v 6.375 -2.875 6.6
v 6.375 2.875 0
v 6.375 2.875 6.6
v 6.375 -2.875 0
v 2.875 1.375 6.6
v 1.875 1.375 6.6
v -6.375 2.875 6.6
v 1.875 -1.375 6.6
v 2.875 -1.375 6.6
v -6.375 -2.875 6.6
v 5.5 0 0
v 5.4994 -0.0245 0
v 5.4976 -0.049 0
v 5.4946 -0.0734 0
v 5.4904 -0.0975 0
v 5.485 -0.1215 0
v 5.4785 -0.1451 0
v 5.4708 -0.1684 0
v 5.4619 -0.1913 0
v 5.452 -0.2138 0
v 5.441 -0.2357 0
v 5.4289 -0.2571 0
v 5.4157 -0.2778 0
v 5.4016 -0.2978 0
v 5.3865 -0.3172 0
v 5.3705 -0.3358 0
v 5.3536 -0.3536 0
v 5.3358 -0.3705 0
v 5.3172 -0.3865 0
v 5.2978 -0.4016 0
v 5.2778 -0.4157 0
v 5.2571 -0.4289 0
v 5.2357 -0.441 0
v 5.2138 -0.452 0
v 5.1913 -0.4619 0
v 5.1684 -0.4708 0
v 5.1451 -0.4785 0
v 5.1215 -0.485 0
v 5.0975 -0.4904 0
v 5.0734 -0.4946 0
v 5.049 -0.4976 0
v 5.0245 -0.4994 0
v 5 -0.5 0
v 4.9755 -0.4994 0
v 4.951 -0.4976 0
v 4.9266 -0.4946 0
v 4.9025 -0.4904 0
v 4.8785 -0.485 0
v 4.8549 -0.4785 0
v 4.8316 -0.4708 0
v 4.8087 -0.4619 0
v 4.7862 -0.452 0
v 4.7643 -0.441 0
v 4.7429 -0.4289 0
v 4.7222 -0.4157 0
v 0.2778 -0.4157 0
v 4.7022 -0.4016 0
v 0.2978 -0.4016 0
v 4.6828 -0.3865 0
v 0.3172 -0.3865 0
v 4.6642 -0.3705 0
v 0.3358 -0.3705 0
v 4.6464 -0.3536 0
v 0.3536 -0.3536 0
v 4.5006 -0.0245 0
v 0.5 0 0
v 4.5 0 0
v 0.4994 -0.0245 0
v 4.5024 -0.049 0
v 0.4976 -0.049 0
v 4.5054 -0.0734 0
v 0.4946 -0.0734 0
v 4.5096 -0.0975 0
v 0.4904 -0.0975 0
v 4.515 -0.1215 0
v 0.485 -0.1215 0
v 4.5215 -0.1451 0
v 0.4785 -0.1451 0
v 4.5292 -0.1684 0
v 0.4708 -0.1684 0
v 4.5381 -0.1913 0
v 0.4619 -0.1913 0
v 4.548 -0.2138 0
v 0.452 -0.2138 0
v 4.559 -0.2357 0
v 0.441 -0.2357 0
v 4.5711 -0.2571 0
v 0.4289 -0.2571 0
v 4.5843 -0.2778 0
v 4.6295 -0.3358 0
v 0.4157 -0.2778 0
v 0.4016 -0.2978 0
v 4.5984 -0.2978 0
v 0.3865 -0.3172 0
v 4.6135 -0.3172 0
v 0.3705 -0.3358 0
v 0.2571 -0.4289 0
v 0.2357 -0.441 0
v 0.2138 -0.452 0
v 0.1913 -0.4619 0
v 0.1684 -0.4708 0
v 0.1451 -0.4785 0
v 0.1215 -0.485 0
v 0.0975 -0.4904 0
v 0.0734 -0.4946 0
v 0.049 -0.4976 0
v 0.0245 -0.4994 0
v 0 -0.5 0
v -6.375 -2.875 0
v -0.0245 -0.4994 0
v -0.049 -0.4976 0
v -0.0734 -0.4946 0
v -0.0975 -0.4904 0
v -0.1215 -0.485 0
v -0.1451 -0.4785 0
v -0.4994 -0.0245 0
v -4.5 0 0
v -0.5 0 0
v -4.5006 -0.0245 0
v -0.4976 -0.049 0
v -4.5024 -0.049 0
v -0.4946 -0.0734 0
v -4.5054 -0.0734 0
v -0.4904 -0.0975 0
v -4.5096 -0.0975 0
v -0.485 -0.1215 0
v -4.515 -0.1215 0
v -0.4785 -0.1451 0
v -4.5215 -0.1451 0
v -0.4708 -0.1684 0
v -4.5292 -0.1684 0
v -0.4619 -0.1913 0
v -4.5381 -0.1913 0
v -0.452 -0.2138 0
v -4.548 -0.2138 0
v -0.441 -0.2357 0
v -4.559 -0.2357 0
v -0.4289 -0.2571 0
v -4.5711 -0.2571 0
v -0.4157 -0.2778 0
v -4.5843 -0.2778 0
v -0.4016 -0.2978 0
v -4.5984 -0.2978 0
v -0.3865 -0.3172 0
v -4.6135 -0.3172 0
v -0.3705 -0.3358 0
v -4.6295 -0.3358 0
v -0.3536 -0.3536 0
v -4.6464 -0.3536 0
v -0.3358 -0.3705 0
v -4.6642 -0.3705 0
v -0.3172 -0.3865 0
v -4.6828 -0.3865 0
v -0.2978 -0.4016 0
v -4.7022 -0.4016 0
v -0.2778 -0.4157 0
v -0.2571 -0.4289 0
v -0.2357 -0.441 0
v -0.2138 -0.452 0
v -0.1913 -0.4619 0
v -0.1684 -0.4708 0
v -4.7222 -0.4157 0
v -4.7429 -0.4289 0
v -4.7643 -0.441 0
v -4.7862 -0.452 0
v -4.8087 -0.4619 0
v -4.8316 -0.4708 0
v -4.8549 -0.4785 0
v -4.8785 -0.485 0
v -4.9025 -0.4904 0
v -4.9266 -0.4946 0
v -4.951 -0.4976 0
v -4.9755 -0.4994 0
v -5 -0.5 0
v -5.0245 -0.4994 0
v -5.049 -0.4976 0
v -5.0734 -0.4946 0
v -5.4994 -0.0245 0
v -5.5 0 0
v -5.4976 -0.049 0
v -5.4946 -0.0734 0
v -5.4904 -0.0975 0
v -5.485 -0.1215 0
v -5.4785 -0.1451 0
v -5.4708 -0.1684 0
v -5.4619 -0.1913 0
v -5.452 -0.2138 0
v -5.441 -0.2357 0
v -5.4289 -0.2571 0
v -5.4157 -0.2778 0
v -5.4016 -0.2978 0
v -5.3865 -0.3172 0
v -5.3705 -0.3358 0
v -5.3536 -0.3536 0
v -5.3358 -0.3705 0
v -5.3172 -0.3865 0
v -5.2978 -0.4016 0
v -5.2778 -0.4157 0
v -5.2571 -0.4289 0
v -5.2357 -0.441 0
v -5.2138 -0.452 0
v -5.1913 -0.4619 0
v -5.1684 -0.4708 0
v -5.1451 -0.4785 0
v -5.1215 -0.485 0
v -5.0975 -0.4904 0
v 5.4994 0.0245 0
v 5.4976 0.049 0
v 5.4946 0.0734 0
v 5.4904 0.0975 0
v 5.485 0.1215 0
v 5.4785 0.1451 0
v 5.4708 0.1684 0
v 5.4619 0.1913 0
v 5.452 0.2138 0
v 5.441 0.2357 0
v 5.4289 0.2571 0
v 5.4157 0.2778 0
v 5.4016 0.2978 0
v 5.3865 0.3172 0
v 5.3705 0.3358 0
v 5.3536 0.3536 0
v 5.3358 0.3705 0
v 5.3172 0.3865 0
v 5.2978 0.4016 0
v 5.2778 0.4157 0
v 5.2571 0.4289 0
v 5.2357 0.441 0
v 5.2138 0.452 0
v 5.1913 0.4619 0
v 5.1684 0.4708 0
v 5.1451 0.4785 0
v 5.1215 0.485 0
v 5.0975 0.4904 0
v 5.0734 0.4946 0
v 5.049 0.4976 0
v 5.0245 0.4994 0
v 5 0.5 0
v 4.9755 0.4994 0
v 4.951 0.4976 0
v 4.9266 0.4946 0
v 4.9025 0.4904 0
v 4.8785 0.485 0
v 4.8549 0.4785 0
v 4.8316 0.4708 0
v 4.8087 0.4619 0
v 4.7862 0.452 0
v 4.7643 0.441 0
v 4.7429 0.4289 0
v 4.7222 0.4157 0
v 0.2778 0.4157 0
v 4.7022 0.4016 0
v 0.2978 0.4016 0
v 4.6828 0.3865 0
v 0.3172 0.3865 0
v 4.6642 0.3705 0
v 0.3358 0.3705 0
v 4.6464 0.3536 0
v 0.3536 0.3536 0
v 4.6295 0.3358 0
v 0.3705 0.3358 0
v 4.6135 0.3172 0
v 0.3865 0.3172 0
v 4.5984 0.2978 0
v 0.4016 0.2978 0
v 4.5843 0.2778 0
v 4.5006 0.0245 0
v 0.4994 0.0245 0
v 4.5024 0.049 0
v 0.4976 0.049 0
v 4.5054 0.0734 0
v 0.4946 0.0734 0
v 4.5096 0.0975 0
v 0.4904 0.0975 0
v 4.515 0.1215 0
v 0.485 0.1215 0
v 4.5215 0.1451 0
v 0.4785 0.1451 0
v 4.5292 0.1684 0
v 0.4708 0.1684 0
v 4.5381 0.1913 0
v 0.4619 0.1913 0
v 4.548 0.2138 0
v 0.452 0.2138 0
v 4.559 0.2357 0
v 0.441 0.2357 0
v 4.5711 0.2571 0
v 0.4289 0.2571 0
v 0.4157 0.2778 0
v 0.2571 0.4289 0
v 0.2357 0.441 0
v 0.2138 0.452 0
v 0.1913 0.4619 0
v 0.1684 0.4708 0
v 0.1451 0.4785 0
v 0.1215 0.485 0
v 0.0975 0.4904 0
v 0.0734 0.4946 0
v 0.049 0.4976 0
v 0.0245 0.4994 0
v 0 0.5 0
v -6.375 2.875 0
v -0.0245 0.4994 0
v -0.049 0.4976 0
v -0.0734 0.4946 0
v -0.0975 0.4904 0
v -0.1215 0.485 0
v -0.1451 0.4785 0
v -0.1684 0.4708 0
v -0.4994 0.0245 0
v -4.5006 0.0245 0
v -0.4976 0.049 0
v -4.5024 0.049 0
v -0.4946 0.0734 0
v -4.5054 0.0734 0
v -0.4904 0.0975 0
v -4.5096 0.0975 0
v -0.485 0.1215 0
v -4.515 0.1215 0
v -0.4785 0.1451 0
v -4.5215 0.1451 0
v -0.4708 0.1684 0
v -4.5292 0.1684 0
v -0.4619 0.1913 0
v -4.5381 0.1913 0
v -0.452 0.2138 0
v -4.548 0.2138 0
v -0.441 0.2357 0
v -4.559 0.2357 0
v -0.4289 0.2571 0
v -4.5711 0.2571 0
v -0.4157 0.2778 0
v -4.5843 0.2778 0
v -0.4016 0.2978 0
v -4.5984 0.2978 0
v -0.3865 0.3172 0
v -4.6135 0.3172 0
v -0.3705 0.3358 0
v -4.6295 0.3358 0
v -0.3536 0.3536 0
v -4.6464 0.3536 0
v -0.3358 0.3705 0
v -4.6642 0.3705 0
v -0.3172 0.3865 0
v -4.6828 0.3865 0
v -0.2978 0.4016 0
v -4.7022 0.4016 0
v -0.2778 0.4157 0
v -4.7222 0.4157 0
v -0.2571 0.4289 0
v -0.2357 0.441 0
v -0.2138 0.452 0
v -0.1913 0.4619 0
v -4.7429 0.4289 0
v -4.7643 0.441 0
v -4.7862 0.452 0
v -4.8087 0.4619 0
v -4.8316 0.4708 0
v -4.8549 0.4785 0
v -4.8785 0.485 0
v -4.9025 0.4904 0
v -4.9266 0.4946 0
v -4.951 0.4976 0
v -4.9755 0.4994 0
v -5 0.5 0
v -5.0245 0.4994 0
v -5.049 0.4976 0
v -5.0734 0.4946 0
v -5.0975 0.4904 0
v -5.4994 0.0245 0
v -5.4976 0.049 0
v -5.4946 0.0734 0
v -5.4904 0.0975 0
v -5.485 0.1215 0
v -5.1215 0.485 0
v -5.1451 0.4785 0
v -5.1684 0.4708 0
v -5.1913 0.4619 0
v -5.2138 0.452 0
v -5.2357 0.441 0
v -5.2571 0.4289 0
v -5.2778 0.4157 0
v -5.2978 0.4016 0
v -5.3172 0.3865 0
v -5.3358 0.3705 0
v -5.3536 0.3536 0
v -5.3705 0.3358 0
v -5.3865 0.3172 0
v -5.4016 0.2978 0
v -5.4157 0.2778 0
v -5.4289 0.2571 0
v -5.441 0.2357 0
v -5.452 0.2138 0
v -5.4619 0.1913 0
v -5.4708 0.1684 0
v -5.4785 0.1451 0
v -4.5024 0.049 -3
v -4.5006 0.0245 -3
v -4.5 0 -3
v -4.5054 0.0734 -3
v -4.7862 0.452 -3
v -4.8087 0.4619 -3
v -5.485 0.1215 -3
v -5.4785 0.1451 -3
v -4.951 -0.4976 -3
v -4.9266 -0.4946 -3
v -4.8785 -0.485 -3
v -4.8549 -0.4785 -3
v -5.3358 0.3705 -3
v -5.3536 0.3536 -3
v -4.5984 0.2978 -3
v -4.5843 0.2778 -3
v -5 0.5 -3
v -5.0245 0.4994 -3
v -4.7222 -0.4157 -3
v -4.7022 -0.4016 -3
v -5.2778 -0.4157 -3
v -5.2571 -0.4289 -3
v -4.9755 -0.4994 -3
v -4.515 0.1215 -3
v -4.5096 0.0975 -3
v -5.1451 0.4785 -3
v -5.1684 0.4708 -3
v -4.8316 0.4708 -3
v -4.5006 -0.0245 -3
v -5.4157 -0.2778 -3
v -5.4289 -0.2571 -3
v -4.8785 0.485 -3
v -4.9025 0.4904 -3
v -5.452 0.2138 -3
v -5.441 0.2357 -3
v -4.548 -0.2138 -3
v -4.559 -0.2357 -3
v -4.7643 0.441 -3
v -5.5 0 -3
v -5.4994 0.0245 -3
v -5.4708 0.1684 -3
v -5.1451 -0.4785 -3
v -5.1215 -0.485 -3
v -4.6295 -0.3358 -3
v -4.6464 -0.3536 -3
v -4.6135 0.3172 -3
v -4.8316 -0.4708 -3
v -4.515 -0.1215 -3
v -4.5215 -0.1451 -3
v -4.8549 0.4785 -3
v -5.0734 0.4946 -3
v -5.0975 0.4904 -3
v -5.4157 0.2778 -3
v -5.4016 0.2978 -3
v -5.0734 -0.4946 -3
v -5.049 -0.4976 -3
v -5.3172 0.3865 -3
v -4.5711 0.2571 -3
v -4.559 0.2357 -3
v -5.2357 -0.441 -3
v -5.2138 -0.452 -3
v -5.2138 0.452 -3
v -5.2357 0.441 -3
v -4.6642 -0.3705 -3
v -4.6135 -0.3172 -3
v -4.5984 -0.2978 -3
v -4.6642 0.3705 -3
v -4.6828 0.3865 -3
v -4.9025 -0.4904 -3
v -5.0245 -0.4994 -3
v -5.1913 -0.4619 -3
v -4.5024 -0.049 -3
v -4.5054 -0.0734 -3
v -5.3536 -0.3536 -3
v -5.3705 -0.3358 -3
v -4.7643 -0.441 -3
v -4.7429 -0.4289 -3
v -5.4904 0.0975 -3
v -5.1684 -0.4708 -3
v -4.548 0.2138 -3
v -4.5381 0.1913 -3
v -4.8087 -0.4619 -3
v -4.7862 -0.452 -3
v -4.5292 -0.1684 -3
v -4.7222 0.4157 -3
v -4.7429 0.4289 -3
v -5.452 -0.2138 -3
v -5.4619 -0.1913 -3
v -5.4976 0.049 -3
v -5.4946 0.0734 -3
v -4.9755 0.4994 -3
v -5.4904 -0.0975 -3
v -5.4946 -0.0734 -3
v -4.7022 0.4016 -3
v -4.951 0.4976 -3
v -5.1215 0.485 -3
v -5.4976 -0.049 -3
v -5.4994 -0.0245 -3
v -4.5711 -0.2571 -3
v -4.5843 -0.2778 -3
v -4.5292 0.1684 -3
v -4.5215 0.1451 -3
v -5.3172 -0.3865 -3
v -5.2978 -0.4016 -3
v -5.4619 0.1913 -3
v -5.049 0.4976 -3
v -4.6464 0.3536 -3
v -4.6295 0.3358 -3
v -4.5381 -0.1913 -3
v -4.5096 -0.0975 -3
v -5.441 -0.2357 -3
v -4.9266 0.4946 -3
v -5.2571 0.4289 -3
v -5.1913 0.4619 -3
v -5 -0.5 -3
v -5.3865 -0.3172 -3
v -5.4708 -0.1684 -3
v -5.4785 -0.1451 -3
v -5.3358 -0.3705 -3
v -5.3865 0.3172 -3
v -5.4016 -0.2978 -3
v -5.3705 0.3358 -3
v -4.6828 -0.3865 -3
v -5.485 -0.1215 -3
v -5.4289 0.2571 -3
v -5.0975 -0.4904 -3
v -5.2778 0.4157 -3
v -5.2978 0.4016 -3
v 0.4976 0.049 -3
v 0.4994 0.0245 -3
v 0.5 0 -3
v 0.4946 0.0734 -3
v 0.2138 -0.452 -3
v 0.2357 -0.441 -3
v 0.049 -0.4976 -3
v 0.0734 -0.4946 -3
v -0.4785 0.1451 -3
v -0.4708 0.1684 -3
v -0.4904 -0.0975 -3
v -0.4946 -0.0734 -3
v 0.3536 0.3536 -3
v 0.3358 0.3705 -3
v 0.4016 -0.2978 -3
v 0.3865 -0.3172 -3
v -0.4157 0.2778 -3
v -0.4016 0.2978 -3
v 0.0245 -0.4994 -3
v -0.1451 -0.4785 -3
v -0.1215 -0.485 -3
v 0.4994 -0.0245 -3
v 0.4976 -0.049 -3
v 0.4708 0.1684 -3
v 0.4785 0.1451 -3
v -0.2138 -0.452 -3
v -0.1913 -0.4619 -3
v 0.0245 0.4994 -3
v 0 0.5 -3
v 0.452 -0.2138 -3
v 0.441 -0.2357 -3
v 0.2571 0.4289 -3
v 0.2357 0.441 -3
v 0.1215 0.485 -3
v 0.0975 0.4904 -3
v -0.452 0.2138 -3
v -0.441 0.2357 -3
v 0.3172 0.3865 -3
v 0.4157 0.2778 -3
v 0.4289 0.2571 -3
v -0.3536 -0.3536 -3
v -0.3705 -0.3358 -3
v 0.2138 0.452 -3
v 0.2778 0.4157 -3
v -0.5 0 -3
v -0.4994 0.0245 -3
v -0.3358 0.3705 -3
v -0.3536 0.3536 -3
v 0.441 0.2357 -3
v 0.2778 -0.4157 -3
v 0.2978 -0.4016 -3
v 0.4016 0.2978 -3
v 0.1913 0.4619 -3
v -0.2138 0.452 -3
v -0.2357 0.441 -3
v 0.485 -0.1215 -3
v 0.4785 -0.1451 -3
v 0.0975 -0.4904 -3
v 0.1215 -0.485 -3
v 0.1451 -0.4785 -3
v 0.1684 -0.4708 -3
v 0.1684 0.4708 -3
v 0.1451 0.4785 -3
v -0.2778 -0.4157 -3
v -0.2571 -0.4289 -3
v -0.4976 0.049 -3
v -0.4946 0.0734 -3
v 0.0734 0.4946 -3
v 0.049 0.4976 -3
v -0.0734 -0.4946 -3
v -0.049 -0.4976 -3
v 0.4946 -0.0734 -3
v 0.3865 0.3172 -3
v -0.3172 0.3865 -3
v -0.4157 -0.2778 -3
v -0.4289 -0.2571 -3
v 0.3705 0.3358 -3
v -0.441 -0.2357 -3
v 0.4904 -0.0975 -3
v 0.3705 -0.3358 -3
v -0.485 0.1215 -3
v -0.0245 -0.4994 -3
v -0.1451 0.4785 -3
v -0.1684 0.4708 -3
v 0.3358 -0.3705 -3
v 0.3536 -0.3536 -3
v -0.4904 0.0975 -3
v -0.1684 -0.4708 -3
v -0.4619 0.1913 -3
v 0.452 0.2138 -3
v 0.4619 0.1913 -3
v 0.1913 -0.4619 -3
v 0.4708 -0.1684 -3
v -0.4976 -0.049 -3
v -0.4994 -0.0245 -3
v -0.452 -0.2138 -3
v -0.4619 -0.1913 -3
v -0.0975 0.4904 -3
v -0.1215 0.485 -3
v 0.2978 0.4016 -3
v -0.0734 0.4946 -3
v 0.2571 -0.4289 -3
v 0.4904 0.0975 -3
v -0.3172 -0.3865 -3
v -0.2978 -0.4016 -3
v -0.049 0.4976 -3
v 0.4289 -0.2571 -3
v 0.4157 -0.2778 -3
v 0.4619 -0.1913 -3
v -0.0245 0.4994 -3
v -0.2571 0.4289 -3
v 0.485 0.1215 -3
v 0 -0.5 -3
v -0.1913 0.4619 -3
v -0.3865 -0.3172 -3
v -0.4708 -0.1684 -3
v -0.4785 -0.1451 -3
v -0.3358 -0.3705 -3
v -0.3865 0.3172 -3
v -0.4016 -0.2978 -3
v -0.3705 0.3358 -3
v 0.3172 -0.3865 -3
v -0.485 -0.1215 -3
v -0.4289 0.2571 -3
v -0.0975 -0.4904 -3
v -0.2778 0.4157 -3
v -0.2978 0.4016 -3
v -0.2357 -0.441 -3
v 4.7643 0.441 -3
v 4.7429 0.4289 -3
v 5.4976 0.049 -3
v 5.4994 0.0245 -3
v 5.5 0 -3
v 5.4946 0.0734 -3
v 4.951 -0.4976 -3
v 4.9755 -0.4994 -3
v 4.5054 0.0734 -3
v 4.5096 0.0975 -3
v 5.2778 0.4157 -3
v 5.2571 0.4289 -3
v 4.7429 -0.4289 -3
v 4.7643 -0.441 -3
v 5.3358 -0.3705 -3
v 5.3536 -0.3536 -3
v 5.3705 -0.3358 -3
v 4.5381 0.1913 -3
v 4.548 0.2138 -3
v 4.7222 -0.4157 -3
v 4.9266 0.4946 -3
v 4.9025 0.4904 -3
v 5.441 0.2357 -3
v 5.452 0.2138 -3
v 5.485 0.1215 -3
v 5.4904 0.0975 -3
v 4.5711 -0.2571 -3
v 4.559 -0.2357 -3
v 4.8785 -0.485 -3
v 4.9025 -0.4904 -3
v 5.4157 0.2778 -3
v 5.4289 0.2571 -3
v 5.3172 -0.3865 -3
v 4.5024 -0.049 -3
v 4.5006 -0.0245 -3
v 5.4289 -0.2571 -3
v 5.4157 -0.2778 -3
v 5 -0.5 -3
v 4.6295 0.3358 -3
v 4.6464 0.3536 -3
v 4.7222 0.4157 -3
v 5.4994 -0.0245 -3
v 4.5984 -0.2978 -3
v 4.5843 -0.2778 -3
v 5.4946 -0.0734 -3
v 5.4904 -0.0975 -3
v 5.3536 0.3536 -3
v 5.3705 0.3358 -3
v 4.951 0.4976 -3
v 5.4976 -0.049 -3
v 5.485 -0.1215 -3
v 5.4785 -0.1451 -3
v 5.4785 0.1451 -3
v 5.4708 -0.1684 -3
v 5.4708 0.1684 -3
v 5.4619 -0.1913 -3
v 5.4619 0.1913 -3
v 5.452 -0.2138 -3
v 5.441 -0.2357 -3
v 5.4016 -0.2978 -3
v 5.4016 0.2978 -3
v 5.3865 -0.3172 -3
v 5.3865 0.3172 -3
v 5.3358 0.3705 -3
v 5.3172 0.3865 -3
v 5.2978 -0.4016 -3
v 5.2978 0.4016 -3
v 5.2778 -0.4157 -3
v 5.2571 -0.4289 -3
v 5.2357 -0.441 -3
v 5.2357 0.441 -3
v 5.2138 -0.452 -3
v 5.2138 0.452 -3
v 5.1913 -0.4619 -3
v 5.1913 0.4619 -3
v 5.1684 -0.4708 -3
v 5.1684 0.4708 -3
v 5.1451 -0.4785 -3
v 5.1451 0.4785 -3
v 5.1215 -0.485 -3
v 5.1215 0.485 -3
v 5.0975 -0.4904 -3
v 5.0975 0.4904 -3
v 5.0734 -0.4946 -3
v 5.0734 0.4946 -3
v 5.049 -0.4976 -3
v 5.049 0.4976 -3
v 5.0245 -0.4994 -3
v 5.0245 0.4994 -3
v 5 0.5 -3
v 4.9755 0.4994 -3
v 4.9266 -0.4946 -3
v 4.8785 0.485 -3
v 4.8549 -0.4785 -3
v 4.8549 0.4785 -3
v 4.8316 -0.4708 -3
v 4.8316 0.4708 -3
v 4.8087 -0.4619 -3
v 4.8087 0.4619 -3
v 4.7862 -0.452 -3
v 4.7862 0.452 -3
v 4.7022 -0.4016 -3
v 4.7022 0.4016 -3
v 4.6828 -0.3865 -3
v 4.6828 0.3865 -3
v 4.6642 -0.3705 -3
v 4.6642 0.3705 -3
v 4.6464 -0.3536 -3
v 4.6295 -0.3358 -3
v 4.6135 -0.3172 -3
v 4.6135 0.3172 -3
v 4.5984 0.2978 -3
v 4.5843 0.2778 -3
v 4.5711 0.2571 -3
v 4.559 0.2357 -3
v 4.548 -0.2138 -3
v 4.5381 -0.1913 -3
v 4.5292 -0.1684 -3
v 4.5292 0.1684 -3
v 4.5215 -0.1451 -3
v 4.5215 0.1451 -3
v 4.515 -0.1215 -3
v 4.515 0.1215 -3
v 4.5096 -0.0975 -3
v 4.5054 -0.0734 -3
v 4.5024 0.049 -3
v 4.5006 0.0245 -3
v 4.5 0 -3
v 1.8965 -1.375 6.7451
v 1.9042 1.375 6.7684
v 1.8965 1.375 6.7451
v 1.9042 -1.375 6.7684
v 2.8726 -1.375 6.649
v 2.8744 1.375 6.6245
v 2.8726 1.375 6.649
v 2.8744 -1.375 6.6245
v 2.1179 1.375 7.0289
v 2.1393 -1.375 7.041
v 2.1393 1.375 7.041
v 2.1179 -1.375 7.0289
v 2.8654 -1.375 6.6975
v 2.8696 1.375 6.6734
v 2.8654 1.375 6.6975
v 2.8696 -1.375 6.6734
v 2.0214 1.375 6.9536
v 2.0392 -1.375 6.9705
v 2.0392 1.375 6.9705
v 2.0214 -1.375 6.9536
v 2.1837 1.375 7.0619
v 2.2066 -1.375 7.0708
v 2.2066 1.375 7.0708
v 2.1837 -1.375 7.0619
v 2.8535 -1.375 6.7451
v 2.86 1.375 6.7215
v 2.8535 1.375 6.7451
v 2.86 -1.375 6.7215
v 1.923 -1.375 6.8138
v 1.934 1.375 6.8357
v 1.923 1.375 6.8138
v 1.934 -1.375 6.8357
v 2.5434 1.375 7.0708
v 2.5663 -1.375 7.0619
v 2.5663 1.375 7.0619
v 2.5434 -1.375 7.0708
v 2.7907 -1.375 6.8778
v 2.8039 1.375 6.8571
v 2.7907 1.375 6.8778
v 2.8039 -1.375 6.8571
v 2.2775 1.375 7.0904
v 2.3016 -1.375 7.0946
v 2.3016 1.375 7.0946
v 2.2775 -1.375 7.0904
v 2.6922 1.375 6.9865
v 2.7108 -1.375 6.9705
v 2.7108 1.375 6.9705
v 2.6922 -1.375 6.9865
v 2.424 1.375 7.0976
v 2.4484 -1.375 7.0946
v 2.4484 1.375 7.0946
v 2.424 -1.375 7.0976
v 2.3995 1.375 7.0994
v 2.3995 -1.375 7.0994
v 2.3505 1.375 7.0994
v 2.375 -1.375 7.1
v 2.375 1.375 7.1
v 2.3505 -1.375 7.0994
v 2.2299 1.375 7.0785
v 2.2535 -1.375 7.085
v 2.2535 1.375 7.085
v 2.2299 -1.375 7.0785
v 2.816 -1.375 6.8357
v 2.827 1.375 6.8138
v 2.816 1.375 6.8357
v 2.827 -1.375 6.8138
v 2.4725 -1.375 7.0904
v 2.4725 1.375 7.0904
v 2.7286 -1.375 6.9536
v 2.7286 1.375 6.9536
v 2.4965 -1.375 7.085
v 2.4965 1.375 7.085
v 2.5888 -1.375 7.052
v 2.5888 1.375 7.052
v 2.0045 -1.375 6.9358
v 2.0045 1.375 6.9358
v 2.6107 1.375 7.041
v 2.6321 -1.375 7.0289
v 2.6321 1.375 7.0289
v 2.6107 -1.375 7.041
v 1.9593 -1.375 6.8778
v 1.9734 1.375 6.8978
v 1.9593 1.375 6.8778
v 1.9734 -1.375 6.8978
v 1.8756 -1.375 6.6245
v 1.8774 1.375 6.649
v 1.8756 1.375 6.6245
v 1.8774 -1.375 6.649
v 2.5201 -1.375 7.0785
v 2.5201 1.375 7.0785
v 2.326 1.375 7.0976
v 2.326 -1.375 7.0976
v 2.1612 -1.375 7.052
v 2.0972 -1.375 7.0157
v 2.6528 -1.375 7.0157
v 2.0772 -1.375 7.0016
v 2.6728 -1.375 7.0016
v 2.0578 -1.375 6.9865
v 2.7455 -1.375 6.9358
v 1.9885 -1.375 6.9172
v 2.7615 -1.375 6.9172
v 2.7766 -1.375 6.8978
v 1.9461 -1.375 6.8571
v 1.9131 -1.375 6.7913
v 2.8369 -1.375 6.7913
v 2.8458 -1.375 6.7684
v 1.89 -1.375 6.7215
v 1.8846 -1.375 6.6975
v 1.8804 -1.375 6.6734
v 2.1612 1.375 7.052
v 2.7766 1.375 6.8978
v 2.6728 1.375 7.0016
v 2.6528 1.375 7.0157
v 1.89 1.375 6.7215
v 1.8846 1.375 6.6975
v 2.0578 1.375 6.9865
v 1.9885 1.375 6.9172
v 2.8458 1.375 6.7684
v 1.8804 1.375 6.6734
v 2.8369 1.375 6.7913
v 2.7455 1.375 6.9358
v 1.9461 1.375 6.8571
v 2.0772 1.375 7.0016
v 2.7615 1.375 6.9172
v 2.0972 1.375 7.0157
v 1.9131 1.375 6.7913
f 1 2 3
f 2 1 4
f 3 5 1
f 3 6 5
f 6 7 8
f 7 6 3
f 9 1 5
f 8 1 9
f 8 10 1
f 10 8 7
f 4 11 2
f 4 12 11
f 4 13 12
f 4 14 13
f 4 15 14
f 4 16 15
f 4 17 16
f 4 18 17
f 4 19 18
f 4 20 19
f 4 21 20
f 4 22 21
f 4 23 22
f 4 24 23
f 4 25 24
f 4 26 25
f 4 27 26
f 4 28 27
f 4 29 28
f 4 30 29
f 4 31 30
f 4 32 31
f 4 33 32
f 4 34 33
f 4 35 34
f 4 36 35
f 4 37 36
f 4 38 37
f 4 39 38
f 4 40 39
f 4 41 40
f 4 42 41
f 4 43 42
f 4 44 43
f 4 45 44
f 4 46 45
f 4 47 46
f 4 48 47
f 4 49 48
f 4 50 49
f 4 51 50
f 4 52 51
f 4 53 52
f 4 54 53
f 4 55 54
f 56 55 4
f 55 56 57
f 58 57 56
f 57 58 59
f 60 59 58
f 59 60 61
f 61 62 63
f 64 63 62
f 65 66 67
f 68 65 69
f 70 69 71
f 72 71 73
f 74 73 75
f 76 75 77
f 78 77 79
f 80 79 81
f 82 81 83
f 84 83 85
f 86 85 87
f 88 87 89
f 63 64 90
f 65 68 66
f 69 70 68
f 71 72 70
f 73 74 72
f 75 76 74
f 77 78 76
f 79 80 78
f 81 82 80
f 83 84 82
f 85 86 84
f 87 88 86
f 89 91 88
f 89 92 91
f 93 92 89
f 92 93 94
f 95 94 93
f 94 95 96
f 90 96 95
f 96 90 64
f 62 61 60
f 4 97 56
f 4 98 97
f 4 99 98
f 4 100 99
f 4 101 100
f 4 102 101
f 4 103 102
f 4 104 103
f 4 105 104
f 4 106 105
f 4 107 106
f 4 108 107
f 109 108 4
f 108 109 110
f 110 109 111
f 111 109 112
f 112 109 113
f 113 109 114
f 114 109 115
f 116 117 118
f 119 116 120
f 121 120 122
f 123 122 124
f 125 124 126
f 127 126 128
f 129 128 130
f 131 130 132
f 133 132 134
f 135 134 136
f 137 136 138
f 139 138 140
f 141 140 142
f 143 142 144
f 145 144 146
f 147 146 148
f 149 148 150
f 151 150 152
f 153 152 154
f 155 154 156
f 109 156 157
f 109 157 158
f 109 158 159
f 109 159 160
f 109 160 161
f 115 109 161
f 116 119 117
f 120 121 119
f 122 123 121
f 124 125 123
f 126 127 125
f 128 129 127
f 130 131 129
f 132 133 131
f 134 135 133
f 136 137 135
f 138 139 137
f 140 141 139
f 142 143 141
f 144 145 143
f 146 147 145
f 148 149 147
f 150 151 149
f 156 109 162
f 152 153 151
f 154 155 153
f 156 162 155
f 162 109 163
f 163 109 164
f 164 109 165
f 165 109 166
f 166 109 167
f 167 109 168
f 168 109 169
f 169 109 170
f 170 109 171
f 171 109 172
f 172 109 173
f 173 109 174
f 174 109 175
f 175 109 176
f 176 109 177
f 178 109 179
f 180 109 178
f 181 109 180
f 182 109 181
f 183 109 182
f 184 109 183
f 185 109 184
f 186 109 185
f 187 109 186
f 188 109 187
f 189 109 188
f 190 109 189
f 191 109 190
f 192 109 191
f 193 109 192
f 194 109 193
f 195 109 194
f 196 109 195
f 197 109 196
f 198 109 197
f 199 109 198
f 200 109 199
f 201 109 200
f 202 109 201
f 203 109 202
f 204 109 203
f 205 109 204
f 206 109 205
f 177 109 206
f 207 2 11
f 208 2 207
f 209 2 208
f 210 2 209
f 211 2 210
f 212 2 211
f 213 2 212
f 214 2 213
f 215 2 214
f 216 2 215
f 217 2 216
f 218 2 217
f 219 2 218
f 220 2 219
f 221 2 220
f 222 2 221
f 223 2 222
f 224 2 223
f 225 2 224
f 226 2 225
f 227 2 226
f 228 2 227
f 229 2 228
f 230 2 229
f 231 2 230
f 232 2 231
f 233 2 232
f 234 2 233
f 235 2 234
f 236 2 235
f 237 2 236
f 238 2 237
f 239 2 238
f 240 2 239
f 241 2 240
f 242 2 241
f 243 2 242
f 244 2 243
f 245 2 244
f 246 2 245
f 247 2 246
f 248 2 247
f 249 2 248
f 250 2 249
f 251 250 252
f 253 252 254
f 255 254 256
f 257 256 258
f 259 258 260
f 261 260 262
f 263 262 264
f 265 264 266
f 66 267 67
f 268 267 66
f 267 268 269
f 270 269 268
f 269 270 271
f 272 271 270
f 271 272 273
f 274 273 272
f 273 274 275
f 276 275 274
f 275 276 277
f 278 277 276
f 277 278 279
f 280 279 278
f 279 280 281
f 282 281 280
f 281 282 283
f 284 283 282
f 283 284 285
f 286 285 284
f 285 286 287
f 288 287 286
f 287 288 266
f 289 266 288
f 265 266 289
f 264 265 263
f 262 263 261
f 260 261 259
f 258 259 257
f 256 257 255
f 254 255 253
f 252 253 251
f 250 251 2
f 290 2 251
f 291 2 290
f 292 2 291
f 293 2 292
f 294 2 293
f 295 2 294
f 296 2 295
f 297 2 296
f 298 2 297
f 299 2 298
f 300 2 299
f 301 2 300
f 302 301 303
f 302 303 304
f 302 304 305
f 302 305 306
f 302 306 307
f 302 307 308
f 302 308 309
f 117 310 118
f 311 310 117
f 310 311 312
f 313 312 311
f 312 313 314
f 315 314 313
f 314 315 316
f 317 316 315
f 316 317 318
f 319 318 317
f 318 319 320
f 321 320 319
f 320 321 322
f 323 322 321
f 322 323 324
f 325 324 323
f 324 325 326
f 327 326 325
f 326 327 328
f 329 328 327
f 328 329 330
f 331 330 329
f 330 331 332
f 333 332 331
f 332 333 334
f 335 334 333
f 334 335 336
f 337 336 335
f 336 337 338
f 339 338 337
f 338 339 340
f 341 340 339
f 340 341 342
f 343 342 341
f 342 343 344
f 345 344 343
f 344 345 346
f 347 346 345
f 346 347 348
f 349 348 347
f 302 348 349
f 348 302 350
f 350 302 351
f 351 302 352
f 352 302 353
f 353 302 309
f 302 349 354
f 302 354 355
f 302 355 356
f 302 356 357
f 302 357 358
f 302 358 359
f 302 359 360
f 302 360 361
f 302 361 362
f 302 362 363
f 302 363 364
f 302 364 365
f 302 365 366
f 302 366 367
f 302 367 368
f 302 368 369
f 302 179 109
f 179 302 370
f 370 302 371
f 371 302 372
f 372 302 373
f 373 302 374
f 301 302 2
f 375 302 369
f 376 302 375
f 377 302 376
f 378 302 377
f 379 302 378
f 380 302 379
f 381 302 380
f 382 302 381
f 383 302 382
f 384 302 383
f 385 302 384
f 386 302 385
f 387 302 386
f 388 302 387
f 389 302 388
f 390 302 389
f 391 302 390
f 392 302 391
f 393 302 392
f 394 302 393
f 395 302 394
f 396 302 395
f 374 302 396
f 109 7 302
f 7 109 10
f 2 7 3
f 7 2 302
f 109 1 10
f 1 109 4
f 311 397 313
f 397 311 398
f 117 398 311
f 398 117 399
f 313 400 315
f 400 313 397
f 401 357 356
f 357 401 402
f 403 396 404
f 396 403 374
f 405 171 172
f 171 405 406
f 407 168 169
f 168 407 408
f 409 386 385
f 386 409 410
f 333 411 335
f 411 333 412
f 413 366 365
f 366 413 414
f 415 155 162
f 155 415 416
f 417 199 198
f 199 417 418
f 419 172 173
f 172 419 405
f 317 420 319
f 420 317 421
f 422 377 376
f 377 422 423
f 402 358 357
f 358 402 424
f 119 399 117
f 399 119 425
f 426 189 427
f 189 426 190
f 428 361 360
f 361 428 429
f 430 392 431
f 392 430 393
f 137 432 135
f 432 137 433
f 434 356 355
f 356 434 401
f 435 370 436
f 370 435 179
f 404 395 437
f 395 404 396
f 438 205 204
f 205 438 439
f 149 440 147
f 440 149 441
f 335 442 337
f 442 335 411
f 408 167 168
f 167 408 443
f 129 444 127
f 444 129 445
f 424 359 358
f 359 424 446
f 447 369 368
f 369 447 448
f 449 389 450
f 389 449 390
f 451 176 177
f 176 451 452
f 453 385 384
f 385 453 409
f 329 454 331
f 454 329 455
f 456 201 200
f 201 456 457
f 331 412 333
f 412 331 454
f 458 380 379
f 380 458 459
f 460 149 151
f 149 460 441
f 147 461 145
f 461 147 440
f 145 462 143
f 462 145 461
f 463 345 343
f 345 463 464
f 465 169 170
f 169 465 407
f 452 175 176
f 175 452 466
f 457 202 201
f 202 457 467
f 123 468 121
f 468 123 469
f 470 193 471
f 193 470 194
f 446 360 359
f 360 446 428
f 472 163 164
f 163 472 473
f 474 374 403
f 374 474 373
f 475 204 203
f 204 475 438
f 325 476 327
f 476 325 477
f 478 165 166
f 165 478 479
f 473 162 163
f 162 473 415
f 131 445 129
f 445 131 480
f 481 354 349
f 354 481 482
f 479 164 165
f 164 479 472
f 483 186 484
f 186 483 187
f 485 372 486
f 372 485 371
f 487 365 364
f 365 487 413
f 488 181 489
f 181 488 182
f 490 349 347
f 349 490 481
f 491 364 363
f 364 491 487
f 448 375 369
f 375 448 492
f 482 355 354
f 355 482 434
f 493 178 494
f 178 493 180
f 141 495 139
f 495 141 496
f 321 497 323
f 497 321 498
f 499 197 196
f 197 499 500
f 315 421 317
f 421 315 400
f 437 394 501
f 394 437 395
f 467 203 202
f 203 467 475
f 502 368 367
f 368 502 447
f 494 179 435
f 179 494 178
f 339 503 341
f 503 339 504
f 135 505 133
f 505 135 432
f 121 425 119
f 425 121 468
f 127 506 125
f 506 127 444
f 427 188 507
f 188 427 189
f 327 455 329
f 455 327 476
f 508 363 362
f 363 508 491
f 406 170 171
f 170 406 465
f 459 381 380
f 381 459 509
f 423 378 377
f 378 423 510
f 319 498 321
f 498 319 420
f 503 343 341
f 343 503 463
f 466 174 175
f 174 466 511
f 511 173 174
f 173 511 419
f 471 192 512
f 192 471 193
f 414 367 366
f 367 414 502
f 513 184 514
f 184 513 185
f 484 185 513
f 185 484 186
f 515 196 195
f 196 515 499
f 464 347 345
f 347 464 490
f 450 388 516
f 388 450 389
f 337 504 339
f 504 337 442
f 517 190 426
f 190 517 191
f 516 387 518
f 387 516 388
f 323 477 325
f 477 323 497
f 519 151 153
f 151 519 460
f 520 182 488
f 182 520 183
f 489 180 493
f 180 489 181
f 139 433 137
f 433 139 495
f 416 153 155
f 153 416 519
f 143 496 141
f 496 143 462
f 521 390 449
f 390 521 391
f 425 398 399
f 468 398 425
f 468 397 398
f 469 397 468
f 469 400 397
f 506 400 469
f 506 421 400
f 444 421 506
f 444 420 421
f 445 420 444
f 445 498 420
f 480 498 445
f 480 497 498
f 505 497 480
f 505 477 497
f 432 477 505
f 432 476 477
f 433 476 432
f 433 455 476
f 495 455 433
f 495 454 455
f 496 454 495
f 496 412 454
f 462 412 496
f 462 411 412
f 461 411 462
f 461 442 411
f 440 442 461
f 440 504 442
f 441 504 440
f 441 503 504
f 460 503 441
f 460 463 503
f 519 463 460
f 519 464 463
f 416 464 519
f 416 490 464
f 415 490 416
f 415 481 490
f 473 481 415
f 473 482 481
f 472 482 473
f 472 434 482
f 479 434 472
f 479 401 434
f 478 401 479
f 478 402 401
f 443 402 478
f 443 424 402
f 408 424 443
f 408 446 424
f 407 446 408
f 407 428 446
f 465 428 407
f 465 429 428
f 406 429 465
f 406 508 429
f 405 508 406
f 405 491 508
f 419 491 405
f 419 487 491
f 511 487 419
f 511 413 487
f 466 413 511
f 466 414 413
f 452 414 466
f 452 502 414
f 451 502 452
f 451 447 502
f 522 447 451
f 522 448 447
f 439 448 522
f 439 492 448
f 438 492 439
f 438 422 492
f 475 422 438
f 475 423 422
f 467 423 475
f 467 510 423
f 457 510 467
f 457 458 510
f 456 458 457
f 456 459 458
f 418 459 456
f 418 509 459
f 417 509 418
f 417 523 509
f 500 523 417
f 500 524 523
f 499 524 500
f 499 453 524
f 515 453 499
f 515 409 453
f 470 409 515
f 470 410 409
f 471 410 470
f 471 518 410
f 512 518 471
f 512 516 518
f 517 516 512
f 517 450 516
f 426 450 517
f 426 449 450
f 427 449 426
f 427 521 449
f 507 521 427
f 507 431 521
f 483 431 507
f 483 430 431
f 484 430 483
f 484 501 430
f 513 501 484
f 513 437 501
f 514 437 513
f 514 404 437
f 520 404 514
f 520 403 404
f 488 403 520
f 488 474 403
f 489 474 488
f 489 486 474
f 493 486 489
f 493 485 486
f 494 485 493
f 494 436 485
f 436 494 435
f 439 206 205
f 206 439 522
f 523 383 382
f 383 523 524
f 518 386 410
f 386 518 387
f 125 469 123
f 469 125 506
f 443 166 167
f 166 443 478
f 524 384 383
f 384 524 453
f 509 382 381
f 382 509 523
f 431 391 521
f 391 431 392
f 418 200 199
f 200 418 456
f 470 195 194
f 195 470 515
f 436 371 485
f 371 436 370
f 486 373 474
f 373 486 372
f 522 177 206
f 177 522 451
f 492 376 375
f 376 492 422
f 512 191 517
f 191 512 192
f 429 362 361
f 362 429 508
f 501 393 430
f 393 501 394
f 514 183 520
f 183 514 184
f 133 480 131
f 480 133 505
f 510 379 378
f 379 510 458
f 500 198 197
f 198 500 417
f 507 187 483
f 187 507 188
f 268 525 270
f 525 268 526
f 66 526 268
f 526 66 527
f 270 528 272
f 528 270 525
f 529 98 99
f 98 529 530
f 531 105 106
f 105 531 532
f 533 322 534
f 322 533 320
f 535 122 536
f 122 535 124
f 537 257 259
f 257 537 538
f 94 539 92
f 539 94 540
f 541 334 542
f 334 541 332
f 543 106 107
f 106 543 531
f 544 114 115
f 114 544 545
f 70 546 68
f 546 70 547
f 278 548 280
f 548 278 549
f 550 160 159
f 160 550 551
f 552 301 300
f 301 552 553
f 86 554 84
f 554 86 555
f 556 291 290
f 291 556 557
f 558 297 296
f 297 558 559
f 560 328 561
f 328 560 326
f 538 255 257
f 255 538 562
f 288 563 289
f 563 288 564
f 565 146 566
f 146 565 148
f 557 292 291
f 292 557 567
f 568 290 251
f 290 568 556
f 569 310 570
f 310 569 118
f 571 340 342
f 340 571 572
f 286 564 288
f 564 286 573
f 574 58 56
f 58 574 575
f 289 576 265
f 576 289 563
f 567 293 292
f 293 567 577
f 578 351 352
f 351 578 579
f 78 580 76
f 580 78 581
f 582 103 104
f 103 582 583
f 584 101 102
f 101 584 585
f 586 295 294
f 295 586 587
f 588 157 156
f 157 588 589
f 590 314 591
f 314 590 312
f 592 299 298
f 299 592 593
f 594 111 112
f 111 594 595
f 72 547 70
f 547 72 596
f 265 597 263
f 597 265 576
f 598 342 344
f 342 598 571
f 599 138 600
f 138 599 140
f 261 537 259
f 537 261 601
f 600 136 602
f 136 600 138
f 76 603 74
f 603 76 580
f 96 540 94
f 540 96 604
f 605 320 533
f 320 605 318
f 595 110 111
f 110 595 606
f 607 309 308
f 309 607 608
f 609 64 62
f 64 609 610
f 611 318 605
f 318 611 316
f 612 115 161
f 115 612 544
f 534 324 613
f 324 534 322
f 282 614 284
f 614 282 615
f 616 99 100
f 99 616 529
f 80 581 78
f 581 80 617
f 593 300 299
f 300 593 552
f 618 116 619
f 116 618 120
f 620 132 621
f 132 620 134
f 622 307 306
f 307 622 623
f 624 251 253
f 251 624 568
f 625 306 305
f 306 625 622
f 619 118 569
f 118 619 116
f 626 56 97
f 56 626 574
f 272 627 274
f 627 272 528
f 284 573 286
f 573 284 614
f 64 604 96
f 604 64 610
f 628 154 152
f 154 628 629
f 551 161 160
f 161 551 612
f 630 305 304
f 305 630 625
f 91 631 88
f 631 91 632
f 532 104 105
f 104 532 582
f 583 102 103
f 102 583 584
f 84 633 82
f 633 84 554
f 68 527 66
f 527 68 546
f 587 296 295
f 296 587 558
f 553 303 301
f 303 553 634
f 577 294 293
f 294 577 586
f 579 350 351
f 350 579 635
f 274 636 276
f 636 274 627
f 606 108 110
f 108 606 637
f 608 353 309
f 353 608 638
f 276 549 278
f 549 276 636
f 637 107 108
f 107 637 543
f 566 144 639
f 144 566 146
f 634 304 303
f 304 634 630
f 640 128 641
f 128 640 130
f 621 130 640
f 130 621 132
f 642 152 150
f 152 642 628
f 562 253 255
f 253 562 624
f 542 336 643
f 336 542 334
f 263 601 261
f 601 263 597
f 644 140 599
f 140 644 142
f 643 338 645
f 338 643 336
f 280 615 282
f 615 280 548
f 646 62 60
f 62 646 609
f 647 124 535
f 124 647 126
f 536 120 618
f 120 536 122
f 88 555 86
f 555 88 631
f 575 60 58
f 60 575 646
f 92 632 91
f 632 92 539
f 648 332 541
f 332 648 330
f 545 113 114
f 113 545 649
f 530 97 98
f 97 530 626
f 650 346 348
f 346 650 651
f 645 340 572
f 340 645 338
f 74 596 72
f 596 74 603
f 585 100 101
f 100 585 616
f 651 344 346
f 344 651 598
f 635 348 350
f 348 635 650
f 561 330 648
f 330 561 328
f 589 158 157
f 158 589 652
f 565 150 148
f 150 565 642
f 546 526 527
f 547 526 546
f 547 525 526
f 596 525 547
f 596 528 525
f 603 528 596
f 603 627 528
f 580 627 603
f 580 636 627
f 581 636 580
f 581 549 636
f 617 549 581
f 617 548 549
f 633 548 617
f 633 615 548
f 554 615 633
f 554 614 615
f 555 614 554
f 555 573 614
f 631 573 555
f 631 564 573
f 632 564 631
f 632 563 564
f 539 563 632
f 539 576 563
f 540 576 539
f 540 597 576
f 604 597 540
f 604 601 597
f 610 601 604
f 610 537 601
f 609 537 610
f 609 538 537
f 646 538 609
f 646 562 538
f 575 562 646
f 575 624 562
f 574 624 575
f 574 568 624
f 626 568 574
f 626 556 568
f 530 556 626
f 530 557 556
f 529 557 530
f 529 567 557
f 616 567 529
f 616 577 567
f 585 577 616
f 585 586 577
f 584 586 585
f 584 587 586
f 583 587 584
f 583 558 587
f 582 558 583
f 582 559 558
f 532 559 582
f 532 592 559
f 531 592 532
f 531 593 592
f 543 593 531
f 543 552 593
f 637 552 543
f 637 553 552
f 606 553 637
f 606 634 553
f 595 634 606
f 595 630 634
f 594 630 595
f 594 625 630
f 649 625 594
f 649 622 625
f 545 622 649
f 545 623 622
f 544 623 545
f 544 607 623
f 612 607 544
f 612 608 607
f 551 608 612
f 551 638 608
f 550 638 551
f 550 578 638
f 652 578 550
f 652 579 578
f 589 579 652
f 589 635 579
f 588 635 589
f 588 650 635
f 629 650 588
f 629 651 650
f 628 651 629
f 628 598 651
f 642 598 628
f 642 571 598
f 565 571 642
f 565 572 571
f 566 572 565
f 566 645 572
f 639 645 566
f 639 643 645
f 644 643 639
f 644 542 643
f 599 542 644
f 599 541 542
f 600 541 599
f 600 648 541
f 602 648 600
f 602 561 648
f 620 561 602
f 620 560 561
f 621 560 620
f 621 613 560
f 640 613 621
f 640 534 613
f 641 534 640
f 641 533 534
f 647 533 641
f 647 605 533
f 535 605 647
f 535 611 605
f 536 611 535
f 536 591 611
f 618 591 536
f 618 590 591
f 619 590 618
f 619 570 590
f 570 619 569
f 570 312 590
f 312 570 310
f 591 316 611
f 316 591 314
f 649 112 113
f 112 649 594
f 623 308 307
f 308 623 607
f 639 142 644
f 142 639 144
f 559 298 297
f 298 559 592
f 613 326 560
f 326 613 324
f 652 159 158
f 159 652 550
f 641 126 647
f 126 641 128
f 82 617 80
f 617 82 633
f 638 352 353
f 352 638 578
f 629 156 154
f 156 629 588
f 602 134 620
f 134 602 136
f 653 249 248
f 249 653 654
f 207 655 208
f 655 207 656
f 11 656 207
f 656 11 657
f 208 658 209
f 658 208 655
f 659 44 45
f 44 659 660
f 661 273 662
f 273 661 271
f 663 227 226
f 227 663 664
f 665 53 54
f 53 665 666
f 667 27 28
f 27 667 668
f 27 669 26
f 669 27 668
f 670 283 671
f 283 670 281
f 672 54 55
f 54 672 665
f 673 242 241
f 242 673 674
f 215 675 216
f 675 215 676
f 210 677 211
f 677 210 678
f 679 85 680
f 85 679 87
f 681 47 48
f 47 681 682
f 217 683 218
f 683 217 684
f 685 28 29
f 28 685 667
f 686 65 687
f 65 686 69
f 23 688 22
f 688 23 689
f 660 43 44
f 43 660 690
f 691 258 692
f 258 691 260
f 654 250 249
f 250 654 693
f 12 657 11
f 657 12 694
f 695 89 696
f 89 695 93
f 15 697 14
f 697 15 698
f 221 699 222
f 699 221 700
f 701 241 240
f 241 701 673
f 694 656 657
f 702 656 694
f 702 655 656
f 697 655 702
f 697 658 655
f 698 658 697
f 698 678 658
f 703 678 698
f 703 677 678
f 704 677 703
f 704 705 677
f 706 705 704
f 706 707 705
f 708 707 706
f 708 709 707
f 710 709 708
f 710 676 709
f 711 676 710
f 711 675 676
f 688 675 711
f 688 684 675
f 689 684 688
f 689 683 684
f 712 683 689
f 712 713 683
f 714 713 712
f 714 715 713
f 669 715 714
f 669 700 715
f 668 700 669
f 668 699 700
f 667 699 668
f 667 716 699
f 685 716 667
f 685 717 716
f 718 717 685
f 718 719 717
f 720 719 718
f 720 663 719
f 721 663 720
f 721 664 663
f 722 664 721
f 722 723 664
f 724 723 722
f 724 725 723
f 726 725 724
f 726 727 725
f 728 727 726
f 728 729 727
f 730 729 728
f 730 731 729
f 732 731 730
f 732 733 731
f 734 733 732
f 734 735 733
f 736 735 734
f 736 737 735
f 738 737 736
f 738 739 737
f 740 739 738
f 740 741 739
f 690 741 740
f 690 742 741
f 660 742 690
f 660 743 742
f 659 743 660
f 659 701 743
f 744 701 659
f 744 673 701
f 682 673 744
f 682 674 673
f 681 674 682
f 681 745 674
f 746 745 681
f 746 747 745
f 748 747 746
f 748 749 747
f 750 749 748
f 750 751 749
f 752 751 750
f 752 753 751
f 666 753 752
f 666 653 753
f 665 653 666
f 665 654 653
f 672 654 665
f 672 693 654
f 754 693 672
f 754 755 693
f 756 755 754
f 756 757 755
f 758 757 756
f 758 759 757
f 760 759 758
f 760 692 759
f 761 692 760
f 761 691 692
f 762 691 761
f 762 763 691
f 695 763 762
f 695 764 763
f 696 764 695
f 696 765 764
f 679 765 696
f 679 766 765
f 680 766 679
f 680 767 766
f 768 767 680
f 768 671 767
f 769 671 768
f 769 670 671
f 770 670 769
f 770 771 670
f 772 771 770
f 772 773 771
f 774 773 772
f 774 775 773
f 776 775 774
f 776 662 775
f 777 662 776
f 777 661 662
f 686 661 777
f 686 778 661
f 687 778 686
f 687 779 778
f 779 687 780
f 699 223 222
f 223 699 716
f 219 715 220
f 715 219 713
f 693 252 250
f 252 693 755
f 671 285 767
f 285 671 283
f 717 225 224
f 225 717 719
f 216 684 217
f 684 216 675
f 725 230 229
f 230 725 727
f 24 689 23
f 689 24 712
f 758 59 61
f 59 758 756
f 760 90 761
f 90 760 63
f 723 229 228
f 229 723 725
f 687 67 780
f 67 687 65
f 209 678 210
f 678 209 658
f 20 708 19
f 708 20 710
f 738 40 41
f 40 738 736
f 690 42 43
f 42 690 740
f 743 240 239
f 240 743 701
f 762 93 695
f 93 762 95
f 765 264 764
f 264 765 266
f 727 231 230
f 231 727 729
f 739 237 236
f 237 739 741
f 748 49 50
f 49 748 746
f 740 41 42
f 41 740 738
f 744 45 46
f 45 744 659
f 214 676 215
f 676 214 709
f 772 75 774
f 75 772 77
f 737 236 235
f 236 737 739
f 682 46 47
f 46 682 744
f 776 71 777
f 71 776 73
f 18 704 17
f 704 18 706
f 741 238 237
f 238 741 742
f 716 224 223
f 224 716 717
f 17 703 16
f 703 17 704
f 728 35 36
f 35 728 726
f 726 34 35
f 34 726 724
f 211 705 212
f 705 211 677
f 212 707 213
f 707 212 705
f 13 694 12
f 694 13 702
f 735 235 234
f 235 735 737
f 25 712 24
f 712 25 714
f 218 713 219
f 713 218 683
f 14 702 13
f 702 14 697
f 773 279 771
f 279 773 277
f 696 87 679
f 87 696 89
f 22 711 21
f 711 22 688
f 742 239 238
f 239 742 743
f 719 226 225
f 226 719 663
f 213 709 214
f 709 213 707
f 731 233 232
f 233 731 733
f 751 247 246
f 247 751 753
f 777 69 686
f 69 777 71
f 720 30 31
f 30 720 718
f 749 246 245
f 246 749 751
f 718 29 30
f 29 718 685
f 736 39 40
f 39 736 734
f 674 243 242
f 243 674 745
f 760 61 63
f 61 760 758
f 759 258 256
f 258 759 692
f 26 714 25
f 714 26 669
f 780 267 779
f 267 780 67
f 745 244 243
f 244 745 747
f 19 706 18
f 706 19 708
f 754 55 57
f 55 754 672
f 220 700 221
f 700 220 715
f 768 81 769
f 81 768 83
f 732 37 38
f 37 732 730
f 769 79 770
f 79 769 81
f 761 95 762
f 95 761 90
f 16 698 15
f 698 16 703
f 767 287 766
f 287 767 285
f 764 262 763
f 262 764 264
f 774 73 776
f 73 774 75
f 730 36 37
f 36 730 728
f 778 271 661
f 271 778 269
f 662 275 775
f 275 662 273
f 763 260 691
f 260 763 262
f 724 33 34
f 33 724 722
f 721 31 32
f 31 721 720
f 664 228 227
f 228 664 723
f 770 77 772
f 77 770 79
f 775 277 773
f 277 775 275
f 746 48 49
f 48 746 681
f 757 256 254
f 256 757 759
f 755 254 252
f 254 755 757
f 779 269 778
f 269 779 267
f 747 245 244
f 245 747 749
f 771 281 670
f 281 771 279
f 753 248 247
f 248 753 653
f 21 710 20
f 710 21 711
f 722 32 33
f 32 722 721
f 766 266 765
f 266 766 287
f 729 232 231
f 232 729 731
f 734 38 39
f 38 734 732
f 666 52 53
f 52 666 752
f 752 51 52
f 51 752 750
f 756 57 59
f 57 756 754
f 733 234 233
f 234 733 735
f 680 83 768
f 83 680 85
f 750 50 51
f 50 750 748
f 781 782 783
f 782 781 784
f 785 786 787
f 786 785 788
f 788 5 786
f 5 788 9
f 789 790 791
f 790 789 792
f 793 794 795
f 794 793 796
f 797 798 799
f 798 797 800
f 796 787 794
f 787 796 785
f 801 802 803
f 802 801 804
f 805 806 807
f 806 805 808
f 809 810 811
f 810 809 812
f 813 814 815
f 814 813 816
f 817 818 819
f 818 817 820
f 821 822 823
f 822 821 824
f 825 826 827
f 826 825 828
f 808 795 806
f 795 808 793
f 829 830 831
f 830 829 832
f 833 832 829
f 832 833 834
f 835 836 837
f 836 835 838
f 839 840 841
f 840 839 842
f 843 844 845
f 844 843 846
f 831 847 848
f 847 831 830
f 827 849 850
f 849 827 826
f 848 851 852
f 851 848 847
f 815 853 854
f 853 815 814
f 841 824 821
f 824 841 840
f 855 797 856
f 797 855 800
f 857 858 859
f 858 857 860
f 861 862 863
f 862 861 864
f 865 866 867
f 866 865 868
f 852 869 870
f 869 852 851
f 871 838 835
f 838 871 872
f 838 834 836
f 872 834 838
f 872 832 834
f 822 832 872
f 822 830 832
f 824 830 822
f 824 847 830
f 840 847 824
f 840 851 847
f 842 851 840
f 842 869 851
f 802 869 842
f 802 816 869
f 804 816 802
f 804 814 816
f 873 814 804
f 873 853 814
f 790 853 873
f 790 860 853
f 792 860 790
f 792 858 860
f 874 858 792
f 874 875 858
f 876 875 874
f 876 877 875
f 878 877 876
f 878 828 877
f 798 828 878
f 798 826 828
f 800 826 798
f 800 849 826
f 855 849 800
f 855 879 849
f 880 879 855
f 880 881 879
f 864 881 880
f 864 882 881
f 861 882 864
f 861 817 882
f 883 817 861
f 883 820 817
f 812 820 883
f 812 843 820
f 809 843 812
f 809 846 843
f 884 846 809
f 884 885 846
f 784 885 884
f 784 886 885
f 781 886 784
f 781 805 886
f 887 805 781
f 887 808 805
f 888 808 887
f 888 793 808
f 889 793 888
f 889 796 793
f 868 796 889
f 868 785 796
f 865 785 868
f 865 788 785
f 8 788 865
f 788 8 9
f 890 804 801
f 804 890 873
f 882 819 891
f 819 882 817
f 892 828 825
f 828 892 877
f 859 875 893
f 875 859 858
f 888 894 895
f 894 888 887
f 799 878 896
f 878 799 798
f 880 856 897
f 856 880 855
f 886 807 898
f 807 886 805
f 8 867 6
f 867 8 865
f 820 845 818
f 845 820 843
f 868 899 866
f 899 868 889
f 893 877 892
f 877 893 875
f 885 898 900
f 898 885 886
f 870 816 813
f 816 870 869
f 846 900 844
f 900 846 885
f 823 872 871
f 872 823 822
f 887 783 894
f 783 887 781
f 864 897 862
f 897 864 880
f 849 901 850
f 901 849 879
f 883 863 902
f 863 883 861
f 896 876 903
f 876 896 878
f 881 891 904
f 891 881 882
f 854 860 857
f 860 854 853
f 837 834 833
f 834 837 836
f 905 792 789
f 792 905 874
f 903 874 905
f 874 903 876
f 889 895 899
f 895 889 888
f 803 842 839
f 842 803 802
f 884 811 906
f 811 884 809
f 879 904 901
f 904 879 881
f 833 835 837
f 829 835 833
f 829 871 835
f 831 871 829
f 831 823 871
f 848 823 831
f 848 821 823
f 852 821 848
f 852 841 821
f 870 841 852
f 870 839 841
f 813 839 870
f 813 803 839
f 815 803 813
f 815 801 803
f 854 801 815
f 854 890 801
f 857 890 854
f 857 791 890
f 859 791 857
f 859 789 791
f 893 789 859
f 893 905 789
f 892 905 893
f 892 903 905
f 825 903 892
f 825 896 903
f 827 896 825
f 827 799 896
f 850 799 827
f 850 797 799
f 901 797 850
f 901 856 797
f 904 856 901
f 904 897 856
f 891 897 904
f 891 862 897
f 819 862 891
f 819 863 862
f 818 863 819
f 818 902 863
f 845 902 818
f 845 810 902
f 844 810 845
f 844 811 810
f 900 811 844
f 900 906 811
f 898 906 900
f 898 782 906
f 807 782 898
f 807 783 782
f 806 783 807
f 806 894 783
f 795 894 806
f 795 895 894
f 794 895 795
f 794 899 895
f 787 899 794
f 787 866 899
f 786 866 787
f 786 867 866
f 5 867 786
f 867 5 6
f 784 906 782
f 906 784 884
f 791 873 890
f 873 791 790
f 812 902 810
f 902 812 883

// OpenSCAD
// --- INCLUDES ---
/*
All common dimensions are stored in their own SCAD file so that variables are consistent throughout
the multiple files created for this project.
*/
include <Common_Dimensions.scad>

// --- RENDER RESOLUTION ---
/*
Set the rendering resolution. Lower for lower-power systems.
*/
$fn = 128;

// --- DIMENSIONS ---
/*
Local dimensions that are specific to this drawing
*/

// --- MODULES ---
/*
Cutouts and extrusions are all mapped to their own modules to make the model more readable and
reusable.
*/
// None

// --- MAIN BODY MODULES ---
/*
Create the main body module
*/

// Creates a Kailh Blue Micro through-hole switch
module kailh_blue_micro_th(center_at_plunger=false)
{  
    edge_dist = 4.0;
    dia       = 2 * kailh_sw_plunger_r;
    h         = 2.75;
    
    translation = center_at_plunger ? [-(kailh_sw_w / 2 - edge_dist), 0.0, -kailh_sw_d] : [0.0, 0.0, 0.0];

    translate(translation) union()
    {
        // Main body
        color("blue") translate([0.0, 0.0, kailh_sw_d / 2]) cube([kailh_sw_w, kailh_sw_h, kailh_sw_d], center=true);
        
        // Pins
        color("silver") translate([-kailh_sw_pin_dist, 0.0, -kailh_sw_pin_length]) cylinder(d=kailh_sw_pin_pitch, h=kailh_sw_pin_length);
        color("silver") translate([               0.0, 0.0, -kailh_sw_pin_length]) cylinder(d=kailh_sw_pin_pitch, h=kailh_sw_pin_length);
        color("silver") translate([ kailh_sw_pin_dist, 0.0, -kailh_sw_pin_length]) cylinder(d=kailh_sw_pin_pitch, h=kailh_sw_pin_length);
        
        // Switch cylinder/plunger
        color("blue") translate([kailh_sw_w / 2 - edge_dist, 0.0, kailh_sw_d]) rotate([90, 0, 0]) cylinder(d=dia, h=h, center=true);
    }
}

// --- RENDER ---
/*
Actually render the component
*/
kailh_blue_micro_th();
